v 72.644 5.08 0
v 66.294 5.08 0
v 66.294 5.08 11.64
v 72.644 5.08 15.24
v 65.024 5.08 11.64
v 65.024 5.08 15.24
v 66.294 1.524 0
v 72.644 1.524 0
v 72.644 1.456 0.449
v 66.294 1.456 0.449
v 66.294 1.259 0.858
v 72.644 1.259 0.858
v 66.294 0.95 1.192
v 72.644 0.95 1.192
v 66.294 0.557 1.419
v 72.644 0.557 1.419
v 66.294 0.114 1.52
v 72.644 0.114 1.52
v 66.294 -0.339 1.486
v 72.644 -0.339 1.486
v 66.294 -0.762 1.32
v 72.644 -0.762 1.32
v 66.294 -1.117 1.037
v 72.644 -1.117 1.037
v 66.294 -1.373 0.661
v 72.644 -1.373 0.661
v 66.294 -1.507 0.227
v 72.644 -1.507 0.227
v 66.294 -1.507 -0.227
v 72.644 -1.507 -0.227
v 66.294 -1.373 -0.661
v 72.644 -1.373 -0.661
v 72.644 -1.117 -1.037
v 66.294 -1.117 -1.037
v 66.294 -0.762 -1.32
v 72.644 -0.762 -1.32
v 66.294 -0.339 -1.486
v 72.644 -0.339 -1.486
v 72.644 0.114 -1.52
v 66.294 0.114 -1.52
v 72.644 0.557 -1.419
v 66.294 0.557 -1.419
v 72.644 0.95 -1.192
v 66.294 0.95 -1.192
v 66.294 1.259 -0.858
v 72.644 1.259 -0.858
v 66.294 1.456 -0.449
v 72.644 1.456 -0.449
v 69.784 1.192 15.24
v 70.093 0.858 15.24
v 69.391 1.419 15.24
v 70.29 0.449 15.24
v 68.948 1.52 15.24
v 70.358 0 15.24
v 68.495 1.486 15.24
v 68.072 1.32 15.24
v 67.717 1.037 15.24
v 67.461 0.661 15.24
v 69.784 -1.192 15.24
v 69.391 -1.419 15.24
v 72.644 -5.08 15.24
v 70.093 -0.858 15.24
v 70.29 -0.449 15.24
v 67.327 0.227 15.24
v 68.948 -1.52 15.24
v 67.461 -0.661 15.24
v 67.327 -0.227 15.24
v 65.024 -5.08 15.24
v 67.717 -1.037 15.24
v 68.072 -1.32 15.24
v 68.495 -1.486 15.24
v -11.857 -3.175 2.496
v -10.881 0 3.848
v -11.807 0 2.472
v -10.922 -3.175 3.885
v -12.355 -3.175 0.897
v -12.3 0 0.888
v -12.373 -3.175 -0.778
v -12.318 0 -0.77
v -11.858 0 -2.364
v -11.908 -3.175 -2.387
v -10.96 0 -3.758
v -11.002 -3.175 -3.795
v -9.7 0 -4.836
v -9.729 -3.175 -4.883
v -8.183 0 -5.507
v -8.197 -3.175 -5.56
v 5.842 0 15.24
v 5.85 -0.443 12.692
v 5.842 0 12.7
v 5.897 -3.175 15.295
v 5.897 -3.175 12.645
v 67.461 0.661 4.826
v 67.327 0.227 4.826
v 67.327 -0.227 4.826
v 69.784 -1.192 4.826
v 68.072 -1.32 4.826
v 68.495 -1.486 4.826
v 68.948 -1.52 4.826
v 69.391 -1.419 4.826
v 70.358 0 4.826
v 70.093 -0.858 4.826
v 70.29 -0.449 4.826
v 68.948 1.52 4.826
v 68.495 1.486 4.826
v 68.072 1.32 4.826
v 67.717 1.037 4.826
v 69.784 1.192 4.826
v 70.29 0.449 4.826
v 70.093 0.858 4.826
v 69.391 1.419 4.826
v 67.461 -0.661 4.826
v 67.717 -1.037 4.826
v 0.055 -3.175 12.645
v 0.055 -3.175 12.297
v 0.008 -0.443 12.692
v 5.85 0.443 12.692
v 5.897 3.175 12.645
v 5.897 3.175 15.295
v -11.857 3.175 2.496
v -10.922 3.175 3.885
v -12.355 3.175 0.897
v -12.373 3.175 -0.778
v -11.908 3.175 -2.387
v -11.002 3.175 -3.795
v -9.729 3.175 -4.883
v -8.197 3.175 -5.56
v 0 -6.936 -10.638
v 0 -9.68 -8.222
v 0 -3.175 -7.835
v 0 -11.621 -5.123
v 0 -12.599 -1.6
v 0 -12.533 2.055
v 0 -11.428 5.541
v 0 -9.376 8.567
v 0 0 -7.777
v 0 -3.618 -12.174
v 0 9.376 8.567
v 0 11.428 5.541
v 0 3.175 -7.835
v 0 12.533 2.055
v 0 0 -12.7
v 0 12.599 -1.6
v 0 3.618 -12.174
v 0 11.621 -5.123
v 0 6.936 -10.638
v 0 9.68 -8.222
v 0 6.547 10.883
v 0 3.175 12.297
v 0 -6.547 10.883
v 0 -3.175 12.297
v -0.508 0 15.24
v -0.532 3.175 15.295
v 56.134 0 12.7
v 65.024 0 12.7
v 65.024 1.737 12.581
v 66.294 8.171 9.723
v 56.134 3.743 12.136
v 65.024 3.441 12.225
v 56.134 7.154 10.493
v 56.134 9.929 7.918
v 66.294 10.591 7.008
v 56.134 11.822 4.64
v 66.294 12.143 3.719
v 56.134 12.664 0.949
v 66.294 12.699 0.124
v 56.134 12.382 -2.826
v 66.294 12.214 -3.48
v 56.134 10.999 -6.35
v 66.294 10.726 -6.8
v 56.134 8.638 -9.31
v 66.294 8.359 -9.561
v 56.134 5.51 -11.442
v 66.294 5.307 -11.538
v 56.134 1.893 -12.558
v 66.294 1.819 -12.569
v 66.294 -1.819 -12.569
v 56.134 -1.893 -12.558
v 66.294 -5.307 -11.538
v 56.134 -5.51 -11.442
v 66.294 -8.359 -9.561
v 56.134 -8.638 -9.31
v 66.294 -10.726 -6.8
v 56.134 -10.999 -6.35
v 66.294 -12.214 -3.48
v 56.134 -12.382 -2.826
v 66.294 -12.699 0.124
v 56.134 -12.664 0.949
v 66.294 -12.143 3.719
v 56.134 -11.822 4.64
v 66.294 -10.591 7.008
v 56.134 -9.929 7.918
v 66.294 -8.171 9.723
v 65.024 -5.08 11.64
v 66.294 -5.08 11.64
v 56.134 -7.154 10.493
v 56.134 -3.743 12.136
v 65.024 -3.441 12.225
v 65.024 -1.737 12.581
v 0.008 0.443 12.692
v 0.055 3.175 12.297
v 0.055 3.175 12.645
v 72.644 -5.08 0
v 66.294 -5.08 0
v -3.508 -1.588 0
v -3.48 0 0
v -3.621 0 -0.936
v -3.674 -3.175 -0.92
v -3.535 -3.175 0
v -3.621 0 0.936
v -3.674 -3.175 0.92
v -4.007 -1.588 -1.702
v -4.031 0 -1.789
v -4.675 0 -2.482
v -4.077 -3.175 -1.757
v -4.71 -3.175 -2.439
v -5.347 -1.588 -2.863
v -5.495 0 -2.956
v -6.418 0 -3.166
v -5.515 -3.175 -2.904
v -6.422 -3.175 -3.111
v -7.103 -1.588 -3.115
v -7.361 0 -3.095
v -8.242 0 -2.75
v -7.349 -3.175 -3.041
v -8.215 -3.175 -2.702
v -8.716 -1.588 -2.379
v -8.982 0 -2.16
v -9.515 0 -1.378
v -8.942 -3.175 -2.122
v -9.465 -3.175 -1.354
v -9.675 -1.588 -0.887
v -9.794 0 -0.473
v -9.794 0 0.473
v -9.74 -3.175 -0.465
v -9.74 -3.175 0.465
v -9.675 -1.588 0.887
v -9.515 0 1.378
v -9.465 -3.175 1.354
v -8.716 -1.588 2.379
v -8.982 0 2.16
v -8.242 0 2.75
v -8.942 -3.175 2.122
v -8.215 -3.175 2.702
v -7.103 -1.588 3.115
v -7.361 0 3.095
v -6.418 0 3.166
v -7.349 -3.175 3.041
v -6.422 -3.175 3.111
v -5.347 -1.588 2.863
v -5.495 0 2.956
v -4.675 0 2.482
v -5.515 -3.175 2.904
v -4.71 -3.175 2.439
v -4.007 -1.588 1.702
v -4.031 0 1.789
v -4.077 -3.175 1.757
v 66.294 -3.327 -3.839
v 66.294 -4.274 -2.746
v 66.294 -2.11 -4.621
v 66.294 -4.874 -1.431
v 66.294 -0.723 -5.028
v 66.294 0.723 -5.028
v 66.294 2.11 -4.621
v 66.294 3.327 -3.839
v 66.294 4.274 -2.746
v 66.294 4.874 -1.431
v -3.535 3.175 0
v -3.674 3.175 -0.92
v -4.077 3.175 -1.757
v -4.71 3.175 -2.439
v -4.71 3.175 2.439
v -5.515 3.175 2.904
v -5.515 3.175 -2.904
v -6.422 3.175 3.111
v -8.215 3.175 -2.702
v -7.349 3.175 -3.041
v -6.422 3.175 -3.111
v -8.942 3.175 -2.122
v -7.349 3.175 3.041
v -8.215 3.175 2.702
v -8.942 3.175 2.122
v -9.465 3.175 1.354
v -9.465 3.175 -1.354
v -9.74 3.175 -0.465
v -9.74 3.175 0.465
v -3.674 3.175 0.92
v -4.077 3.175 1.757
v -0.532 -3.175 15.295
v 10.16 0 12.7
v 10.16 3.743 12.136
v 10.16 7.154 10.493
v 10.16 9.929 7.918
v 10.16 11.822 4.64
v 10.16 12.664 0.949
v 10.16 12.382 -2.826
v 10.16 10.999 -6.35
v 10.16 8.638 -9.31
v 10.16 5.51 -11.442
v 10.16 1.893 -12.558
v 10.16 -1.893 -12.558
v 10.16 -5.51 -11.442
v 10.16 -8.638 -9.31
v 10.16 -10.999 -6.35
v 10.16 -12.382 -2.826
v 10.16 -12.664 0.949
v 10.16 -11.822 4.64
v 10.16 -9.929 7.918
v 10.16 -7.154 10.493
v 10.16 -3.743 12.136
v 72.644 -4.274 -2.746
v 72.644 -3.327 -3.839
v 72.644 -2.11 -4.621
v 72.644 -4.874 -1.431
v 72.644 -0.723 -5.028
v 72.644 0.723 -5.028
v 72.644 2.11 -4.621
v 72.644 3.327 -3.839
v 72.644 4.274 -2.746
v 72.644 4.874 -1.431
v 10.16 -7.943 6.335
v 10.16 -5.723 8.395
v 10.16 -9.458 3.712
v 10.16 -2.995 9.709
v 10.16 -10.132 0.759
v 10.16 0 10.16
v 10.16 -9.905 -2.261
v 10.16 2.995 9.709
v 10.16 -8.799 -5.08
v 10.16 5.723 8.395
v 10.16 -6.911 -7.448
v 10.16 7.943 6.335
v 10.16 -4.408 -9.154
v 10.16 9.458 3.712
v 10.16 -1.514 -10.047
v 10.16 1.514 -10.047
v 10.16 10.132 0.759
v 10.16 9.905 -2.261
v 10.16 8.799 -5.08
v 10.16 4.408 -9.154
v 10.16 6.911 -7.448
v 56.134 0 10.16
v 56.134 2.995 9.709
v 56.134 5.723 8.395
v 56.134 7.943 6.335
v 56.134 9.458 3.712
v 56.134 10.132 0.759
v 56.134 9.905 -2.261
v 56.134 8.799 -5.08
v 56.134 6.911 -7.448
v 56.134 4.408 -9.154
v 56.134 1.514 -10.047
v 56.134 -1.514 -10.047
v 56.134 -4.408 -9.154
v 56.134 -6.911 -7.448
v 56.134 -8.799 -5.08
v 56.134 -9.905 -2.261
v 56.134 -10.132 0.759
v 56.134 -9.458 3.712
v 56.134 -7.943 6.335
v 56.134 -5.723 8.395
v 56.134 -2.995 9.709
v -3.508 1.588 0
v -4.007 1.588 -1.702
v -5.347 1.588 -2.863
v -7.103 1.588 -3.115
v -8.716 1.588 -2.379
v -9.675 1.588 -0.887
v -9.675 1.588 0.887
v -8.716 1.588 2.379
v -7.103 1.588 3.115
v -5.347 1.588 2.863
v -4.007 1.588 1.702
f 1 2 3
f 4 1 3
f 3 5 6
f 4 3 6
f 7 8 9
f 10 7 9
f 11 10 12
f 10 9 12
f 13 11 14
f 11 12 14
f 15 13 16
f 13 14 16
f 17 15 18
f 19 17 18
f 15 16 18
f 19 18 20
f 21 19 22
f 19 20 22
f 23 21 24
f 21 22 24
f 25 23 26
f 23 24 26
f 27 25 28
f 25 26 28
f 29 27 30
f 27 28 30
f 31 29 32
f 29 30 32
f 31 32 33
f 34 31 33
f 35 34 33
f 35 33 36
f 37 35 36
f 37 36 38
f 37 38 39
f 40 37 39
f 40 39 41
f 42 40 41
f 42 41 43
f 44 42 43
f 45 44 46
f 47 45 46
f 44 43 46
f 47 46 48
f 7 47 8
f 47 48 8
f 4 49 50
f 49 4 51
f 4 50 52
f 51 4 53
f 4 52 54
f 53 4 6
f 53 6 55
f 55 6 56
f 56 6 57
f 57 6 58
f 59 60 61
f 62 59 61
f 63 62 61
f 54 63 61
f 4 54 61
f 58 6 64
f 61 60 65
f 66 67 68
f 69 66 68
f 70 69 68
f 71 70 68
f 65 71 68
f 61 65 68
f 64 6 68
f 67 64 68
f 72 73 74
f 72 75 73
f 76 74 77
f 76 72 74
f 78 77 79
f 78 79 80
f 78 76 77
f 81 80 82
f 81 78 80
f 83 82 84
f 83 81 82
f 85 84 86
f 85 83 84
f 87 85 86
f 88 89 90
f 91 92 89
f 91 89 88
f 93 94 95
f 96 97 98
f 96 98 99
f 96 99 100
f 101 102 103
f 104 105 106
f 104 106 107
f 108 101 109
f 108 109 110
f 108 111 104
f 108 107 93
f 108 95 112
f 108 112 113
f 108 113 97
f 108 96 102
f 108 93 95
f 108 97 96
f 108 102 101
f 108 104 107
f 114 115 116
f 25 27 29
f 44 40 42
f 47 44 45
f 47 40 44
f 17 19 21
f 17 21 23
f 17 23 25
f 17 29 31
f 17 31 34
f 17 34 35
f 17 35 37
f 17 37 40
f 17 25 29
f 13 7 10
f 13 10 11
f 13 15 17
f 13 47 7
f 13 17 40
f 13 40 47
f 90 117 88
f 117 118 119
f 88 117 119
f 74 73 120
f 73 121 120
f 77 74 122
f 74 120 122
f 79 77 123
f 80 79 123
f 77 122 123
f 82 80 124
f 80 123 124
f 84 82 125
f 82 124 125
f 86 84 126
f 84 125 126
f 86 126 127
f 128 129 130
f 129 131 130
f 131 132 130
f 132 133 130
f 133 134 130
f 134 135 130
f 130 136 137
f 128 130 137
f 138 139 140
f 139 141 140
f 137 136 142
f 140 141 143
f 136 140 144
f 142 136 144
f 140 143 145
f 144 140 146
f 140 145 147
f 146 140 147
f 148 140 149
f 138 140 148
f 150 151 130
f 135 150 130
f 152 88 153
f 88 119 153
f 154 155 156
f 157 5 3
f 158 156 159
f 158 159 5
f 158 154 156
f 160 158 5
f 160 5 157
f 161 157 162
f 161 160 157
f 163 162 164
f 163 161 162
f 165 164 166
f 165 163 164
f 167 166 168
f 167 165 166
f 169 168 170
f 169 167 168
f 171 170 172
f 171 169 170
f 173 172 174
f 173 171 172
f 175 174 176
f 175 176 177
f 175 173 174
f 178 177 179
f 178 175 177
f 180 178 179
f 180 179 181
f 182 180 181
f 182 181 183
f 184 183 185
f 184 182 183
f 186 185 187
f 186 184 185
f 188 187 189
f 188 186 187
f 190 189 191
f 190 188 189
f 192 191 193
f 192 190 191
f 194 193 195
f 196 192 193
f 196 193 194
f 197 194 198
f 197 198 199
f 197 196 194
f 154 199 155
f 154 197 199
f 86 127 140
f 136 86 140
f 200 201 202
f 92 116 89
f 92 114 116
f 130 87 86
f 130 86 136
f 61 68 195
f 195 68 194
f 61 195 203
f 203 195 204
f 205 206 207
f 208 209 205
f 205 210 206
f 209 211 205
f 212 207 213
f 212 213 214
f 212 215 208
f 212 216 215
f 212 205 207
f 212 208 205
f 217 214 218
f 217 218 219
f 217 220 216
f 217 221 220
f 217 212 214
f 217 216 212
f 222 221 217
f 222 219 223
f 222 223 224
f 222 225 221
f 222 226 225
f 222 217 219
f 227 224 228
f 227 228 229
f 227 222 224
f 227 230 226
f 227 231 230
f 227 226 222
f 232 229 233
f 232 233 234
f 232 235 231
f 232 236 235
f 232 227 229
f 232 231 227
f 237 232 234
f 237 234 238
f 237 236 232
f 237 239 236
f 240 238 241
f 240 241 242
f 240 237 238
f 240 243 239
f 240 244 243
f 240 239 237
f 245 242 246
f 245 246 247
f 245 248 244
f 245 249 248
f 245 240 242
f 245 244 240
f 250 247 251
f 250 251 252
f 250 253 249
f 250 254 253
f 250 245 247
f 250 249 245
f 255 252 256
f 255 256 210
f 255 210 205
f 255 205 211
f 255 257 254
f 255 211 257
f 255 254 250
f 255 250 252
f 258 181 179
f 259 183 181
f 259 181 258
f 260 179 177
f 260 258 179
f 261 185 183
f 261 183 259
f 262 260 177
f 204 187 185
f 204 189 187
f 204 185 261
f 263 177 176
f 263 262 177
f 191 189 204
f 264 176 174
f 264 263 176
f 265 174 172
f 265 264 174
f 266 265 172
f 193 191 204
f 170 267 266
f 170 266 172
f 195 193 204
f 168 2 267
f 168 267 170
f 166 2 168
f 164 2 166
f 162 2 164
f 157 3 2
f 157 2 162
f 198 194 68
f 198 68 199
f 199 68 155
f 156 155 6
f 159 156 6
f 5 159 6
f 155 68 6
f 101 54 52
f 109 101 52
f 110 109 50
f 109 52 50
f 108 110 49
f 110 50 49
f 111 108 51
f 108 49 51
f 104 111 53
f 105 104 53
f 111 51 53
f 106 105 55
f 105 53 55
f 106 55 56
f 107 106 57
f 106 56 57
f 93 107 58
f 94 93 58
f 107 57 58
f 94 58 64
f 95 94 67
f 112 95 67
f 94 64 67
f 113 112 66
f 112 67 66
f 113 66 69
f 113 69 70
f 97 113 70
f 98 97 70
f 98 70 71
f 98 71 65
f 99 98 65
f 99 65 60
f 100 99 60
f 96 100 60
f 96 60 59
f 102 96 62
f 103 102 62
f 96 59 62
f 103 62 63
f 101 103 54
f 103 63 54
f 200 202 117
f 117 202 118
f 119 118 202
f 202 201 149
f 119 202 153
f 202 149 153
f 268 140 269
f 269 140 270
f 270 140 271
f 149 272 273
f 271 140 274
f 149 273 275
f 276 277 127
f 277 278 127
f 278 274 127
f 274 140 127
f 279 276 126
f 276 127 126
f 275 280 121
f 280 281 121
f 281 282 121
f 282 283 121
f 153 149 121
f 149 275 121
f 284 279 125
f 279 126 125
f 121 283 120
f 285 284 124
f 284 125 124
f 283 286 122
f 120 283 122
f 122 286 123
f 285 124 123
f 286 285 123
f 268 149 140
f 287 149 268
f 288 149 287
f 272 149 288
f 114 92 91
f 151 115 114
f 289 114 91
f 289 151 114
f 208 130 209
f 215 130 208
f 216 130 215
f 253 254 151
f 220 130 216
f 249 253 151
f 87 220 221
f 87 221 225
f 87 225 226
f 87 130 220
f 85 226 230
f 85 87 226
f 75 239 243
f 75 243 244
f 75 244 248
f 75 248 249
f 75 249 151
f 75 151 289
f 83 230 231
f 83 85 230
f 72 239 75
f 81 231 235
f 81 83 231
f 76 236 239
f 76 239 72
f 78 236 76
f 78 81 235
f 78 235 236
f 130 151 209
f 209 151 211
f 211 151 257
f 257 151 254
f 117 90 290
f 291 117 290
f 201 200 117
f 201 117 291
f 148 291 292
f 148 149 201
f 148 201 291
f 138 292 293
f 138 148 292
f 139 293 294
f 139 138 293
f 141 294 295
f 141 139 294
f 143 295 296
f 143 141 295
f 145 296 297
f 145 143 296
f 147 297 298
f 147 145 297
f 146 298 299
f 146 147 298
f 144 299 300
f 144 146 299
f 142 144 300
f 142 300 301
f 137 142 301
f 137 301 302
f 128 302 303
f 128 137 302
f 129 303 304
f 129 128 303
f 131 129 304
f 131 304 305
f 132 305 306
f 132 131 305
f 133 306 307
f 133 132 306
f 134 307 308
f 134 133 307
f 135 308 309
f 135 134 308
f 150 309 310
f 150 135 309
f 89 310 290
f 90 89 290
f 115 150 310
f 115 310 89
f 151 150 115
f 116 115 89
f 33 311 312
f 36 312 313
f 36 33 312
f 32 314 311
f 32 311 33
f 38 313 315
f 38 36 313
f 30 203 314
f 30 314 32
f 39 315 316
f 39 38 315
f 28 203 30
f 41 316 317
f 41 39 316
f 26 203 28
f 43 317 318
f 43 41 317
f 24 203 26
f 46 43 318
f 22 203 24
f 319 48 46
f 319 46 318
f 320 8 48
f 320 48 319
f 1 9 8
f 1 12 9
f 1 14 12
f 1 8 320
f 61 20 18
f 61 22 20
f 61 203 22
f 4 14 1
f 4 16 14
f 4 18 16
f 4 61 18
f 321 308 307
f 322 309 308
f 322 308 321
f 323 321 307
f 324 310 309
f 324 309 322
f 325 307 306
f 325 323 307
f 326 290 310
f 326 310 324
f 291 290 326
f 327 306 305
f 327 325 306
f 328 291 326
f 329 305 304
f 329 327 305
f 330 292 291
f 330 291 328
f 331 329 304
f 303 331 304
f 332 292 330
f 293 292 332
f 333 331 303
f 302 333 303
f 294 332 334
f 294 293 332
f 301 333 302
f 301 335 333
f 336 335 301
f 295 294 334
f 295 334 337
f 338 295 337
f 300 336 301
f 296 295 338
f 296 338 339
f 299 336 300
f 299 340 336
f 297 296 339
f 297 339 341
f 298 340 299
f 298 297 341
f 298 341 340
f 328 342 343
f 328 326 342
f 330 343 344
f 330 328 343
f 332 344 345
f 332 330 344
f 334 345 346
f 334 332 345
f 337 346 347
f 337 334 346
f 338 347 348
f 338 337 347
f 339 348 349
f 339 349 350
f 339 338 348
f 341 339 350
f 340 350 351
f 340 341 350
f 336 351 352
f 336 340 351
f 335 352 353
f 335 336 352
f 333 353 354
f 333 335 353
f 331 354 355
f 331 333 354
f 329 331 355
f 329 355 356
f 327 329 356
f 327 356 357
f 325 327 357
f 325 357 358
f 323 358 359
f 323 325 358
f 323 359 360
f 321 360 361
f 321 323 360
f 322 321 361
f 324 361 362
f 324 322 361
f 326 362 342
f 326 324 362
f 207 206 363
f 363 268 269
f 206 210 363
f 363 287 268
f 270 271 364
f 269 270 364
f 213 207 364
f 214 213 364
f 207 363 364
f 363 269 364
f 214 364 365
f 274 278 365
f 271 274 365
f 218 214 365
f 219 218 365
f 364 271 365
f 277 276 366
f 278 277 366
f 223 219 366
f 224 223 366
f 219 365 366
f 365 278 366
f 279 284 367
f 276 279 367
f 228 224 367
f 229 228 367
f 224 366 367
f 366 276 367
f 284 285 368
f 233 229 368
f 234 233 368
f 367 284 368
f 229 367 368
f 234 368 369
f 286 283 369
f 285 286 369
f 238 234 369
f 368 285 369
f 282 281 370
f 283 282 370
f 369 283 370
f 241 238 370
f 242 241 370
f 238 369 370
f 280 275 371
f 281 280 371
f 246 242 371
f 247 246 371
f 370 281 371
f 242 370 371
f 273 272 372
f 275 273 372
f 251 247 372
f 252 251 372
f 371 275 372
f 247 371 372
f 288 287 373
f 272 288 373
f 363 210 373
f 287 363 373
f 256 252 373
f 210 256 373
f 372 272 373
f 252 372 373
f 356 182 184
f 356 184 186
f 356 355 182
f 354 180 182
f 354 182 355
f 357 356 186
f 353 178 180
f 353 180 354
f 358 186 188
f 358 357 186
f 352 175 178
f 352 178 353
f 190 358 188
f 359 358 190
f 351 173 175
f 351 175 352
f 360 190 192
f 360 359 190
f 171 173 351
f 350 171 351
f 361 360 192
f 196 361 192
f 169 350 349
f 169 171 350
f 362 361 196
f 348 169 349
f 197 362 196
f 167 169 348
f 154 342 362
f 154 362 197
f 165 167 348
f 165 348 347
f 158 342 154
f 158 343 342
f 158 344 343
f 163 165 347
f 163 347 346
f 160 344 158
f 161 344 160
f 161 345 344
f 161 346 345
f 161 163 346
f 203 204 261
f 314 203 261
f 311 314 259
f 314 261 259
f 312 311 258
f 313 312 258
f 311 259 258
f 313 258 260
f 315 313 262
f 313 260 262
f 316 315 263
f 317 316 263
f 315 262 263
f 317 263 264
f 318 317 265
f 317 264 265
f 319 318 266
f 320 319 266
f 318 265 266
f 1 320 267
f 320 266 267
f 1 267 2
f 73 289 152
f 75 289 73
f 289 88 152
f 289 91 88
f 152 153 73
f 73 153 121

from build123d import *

# Parameters (mm, degrees)
F0_W      = 5.842
F0_H      = 12.7
F0_R      = 3.175
F2_DEPTH  = 3.175
F2_TAPER  = -1
F4_DEPTH  = 1.27
F3_R      = 1.524
F5_DEPTH  = 6.35
F6_R      = 1.524
F7_DEPTH  = 6.35
F10_R     = 1.524
F11_DEPTH = 10.414


# Not quite as in the source:
# - a feature of the source that left no trace in its solid (it failed there, or was rolled back) is left out


with BuildPart() as f1:
    # F0 (on Front) → F1 (revolve)
    with BuildSketch(Plane.XZ):
        Polygon((5.842, 12.7), (5.842, 0), (66.294, 0), (66.294, 12.7), (56.134, 12.7), (56.134, 10.16), (10.16, 10.16), (10.16, 12.7), align=None)
        with Locations((2.921, 6.35)):
            Rectangle(F0_W, F0_H)
    revolve(axis=Axis((33.147, 0, 0), (-1, 0, 0)))

    # F0 (on Front) → F2 (join, symmetric)
    with BuildSketch(Plane.XZ):
        with BuildLine():
            Line((5.842, 0), (0, 0))
            Line((0, 0), (-0.9398, 0))
            ThreePointArc((-0.9398, 0), (-3.1957909266, -4.5493385486), (-8.1826630726, -5.5069827884))
            Line((-8.1826630726, -5.5069827884), (5.842, -9.398))
            Line((5.842, -9.398), (5.842, 0))
        make_face()
        with BuildLine():
            ThreePointArc((-8.1826630726, -5.5069827884), (-3.1957909266, -4.5493385486), (-0.9398, 0))
            ThreePointArc((-0.9398, 0), (-4.5919612295, 5.3297205562), (-10.8806298187, 3.8475430269))
            ThreePointArc((-10.8806298187, 3.8475430269), (-12.1459778134, -1.5837270034), (-8.1826630726, -5.5069827884))
        make_face()
        with Locations((-6.6548, 0)):
            Circle(F0_R, mode=Mode.SUBTRACT)
        with BuildLine():
            Line((-0.9398, 0), (0, 0))
            Line((0, 0), (0, 12.7))
            Line((0, 12.7), (5.842, 12.7))
            Line((5.842, 12.7), (5.842, 15.24))
            Line((5.842, 15.24), (-0.508, 15.24))
            Line((-0.508, 15.24), (-10.8806298187, 3.8475430269))
            ThreePointArc((-10.8806298187, 3.8475430269), (-4.5919612295, 5.3297205562), (-0.9398, 0))
        make_face()
    extrude(amount=F2_DEPTH, both=True, taper=F2_TAPER)

    # F3 (on face) → F4 (join)
    with BuildSketch(Plane.YZ.offset(66.294)):
        with BuildLine():
            ThreePointArc((-5.08, 11.6397422652), (0, 12.7), (5.08, 11.6397422652))
            Line((5.08, 11.6397422652), (5.08, 15.24))
            Line((5.08, 15.24), (-5.08, 15.24))
            Line((-5.08, 15.24), (-5.08, 11.6397422652))
        make_face()
    extrude(amount=-F4_DEPTH)

    # F3 (on face) → F5 (join)
    with BuildSketch(Plane.YZ.offset(66.294)):
        with BuildLine():
            ThreePointArc((-5.08, 11.6397422652), (0, 12.7), (5.08, 11.6397422652))
            Line((5.08, 11.6397422652), (5.08, 15.24))
            Line((5.08, 15.24), (-5.08, 15.24))
            Line((-5.08, 15.24), (-5.08, 11.6397422652))
        make_face()
        with BuildLine():
            ThreePointArc((-5.08, 0), (0, 5.08), (5.08, 0))
            Line((5.08, 0), (5.08, 11.6397422652))
            ThreePointArc((5.08, 11.6397422652), (0, 12.7), (-5.08, 11.6397422652))
            Line((-5.08, 11.6397422652), (-5.08, 0))
        make_face()
        with BuildLine():
            ThreePointArc((-5.08, 0), (0, -5.08), (5.08, 0))
            ThreePointArc((5.08, 0), (0, 5.08), (-5.08, 0))
        make_face()
        Circle(F3_R, mode=Mode.SUBTRACT)
        Circle(F3_R)
    extrude(amount=F5_DEPTH)

    # F6 (on face) → F7 (cut, through all)
    with BuildSketch(Plane.YZ.offset(72.644)):
        Circle(F6_R)
    extrude(amount=-F7_DEPTH, mode=Mode.SUBTRACT)

    # F10 (on face) → F11 (cut)
    with BuildSketch(Plane.XY.offset(15.24)):
        with Locations((68.834, 0)):
            Circle(F10_R)
    extrude(amount=-F11_DEPTH, mode=Mode.SUBTRACT)


solid = f1.part
